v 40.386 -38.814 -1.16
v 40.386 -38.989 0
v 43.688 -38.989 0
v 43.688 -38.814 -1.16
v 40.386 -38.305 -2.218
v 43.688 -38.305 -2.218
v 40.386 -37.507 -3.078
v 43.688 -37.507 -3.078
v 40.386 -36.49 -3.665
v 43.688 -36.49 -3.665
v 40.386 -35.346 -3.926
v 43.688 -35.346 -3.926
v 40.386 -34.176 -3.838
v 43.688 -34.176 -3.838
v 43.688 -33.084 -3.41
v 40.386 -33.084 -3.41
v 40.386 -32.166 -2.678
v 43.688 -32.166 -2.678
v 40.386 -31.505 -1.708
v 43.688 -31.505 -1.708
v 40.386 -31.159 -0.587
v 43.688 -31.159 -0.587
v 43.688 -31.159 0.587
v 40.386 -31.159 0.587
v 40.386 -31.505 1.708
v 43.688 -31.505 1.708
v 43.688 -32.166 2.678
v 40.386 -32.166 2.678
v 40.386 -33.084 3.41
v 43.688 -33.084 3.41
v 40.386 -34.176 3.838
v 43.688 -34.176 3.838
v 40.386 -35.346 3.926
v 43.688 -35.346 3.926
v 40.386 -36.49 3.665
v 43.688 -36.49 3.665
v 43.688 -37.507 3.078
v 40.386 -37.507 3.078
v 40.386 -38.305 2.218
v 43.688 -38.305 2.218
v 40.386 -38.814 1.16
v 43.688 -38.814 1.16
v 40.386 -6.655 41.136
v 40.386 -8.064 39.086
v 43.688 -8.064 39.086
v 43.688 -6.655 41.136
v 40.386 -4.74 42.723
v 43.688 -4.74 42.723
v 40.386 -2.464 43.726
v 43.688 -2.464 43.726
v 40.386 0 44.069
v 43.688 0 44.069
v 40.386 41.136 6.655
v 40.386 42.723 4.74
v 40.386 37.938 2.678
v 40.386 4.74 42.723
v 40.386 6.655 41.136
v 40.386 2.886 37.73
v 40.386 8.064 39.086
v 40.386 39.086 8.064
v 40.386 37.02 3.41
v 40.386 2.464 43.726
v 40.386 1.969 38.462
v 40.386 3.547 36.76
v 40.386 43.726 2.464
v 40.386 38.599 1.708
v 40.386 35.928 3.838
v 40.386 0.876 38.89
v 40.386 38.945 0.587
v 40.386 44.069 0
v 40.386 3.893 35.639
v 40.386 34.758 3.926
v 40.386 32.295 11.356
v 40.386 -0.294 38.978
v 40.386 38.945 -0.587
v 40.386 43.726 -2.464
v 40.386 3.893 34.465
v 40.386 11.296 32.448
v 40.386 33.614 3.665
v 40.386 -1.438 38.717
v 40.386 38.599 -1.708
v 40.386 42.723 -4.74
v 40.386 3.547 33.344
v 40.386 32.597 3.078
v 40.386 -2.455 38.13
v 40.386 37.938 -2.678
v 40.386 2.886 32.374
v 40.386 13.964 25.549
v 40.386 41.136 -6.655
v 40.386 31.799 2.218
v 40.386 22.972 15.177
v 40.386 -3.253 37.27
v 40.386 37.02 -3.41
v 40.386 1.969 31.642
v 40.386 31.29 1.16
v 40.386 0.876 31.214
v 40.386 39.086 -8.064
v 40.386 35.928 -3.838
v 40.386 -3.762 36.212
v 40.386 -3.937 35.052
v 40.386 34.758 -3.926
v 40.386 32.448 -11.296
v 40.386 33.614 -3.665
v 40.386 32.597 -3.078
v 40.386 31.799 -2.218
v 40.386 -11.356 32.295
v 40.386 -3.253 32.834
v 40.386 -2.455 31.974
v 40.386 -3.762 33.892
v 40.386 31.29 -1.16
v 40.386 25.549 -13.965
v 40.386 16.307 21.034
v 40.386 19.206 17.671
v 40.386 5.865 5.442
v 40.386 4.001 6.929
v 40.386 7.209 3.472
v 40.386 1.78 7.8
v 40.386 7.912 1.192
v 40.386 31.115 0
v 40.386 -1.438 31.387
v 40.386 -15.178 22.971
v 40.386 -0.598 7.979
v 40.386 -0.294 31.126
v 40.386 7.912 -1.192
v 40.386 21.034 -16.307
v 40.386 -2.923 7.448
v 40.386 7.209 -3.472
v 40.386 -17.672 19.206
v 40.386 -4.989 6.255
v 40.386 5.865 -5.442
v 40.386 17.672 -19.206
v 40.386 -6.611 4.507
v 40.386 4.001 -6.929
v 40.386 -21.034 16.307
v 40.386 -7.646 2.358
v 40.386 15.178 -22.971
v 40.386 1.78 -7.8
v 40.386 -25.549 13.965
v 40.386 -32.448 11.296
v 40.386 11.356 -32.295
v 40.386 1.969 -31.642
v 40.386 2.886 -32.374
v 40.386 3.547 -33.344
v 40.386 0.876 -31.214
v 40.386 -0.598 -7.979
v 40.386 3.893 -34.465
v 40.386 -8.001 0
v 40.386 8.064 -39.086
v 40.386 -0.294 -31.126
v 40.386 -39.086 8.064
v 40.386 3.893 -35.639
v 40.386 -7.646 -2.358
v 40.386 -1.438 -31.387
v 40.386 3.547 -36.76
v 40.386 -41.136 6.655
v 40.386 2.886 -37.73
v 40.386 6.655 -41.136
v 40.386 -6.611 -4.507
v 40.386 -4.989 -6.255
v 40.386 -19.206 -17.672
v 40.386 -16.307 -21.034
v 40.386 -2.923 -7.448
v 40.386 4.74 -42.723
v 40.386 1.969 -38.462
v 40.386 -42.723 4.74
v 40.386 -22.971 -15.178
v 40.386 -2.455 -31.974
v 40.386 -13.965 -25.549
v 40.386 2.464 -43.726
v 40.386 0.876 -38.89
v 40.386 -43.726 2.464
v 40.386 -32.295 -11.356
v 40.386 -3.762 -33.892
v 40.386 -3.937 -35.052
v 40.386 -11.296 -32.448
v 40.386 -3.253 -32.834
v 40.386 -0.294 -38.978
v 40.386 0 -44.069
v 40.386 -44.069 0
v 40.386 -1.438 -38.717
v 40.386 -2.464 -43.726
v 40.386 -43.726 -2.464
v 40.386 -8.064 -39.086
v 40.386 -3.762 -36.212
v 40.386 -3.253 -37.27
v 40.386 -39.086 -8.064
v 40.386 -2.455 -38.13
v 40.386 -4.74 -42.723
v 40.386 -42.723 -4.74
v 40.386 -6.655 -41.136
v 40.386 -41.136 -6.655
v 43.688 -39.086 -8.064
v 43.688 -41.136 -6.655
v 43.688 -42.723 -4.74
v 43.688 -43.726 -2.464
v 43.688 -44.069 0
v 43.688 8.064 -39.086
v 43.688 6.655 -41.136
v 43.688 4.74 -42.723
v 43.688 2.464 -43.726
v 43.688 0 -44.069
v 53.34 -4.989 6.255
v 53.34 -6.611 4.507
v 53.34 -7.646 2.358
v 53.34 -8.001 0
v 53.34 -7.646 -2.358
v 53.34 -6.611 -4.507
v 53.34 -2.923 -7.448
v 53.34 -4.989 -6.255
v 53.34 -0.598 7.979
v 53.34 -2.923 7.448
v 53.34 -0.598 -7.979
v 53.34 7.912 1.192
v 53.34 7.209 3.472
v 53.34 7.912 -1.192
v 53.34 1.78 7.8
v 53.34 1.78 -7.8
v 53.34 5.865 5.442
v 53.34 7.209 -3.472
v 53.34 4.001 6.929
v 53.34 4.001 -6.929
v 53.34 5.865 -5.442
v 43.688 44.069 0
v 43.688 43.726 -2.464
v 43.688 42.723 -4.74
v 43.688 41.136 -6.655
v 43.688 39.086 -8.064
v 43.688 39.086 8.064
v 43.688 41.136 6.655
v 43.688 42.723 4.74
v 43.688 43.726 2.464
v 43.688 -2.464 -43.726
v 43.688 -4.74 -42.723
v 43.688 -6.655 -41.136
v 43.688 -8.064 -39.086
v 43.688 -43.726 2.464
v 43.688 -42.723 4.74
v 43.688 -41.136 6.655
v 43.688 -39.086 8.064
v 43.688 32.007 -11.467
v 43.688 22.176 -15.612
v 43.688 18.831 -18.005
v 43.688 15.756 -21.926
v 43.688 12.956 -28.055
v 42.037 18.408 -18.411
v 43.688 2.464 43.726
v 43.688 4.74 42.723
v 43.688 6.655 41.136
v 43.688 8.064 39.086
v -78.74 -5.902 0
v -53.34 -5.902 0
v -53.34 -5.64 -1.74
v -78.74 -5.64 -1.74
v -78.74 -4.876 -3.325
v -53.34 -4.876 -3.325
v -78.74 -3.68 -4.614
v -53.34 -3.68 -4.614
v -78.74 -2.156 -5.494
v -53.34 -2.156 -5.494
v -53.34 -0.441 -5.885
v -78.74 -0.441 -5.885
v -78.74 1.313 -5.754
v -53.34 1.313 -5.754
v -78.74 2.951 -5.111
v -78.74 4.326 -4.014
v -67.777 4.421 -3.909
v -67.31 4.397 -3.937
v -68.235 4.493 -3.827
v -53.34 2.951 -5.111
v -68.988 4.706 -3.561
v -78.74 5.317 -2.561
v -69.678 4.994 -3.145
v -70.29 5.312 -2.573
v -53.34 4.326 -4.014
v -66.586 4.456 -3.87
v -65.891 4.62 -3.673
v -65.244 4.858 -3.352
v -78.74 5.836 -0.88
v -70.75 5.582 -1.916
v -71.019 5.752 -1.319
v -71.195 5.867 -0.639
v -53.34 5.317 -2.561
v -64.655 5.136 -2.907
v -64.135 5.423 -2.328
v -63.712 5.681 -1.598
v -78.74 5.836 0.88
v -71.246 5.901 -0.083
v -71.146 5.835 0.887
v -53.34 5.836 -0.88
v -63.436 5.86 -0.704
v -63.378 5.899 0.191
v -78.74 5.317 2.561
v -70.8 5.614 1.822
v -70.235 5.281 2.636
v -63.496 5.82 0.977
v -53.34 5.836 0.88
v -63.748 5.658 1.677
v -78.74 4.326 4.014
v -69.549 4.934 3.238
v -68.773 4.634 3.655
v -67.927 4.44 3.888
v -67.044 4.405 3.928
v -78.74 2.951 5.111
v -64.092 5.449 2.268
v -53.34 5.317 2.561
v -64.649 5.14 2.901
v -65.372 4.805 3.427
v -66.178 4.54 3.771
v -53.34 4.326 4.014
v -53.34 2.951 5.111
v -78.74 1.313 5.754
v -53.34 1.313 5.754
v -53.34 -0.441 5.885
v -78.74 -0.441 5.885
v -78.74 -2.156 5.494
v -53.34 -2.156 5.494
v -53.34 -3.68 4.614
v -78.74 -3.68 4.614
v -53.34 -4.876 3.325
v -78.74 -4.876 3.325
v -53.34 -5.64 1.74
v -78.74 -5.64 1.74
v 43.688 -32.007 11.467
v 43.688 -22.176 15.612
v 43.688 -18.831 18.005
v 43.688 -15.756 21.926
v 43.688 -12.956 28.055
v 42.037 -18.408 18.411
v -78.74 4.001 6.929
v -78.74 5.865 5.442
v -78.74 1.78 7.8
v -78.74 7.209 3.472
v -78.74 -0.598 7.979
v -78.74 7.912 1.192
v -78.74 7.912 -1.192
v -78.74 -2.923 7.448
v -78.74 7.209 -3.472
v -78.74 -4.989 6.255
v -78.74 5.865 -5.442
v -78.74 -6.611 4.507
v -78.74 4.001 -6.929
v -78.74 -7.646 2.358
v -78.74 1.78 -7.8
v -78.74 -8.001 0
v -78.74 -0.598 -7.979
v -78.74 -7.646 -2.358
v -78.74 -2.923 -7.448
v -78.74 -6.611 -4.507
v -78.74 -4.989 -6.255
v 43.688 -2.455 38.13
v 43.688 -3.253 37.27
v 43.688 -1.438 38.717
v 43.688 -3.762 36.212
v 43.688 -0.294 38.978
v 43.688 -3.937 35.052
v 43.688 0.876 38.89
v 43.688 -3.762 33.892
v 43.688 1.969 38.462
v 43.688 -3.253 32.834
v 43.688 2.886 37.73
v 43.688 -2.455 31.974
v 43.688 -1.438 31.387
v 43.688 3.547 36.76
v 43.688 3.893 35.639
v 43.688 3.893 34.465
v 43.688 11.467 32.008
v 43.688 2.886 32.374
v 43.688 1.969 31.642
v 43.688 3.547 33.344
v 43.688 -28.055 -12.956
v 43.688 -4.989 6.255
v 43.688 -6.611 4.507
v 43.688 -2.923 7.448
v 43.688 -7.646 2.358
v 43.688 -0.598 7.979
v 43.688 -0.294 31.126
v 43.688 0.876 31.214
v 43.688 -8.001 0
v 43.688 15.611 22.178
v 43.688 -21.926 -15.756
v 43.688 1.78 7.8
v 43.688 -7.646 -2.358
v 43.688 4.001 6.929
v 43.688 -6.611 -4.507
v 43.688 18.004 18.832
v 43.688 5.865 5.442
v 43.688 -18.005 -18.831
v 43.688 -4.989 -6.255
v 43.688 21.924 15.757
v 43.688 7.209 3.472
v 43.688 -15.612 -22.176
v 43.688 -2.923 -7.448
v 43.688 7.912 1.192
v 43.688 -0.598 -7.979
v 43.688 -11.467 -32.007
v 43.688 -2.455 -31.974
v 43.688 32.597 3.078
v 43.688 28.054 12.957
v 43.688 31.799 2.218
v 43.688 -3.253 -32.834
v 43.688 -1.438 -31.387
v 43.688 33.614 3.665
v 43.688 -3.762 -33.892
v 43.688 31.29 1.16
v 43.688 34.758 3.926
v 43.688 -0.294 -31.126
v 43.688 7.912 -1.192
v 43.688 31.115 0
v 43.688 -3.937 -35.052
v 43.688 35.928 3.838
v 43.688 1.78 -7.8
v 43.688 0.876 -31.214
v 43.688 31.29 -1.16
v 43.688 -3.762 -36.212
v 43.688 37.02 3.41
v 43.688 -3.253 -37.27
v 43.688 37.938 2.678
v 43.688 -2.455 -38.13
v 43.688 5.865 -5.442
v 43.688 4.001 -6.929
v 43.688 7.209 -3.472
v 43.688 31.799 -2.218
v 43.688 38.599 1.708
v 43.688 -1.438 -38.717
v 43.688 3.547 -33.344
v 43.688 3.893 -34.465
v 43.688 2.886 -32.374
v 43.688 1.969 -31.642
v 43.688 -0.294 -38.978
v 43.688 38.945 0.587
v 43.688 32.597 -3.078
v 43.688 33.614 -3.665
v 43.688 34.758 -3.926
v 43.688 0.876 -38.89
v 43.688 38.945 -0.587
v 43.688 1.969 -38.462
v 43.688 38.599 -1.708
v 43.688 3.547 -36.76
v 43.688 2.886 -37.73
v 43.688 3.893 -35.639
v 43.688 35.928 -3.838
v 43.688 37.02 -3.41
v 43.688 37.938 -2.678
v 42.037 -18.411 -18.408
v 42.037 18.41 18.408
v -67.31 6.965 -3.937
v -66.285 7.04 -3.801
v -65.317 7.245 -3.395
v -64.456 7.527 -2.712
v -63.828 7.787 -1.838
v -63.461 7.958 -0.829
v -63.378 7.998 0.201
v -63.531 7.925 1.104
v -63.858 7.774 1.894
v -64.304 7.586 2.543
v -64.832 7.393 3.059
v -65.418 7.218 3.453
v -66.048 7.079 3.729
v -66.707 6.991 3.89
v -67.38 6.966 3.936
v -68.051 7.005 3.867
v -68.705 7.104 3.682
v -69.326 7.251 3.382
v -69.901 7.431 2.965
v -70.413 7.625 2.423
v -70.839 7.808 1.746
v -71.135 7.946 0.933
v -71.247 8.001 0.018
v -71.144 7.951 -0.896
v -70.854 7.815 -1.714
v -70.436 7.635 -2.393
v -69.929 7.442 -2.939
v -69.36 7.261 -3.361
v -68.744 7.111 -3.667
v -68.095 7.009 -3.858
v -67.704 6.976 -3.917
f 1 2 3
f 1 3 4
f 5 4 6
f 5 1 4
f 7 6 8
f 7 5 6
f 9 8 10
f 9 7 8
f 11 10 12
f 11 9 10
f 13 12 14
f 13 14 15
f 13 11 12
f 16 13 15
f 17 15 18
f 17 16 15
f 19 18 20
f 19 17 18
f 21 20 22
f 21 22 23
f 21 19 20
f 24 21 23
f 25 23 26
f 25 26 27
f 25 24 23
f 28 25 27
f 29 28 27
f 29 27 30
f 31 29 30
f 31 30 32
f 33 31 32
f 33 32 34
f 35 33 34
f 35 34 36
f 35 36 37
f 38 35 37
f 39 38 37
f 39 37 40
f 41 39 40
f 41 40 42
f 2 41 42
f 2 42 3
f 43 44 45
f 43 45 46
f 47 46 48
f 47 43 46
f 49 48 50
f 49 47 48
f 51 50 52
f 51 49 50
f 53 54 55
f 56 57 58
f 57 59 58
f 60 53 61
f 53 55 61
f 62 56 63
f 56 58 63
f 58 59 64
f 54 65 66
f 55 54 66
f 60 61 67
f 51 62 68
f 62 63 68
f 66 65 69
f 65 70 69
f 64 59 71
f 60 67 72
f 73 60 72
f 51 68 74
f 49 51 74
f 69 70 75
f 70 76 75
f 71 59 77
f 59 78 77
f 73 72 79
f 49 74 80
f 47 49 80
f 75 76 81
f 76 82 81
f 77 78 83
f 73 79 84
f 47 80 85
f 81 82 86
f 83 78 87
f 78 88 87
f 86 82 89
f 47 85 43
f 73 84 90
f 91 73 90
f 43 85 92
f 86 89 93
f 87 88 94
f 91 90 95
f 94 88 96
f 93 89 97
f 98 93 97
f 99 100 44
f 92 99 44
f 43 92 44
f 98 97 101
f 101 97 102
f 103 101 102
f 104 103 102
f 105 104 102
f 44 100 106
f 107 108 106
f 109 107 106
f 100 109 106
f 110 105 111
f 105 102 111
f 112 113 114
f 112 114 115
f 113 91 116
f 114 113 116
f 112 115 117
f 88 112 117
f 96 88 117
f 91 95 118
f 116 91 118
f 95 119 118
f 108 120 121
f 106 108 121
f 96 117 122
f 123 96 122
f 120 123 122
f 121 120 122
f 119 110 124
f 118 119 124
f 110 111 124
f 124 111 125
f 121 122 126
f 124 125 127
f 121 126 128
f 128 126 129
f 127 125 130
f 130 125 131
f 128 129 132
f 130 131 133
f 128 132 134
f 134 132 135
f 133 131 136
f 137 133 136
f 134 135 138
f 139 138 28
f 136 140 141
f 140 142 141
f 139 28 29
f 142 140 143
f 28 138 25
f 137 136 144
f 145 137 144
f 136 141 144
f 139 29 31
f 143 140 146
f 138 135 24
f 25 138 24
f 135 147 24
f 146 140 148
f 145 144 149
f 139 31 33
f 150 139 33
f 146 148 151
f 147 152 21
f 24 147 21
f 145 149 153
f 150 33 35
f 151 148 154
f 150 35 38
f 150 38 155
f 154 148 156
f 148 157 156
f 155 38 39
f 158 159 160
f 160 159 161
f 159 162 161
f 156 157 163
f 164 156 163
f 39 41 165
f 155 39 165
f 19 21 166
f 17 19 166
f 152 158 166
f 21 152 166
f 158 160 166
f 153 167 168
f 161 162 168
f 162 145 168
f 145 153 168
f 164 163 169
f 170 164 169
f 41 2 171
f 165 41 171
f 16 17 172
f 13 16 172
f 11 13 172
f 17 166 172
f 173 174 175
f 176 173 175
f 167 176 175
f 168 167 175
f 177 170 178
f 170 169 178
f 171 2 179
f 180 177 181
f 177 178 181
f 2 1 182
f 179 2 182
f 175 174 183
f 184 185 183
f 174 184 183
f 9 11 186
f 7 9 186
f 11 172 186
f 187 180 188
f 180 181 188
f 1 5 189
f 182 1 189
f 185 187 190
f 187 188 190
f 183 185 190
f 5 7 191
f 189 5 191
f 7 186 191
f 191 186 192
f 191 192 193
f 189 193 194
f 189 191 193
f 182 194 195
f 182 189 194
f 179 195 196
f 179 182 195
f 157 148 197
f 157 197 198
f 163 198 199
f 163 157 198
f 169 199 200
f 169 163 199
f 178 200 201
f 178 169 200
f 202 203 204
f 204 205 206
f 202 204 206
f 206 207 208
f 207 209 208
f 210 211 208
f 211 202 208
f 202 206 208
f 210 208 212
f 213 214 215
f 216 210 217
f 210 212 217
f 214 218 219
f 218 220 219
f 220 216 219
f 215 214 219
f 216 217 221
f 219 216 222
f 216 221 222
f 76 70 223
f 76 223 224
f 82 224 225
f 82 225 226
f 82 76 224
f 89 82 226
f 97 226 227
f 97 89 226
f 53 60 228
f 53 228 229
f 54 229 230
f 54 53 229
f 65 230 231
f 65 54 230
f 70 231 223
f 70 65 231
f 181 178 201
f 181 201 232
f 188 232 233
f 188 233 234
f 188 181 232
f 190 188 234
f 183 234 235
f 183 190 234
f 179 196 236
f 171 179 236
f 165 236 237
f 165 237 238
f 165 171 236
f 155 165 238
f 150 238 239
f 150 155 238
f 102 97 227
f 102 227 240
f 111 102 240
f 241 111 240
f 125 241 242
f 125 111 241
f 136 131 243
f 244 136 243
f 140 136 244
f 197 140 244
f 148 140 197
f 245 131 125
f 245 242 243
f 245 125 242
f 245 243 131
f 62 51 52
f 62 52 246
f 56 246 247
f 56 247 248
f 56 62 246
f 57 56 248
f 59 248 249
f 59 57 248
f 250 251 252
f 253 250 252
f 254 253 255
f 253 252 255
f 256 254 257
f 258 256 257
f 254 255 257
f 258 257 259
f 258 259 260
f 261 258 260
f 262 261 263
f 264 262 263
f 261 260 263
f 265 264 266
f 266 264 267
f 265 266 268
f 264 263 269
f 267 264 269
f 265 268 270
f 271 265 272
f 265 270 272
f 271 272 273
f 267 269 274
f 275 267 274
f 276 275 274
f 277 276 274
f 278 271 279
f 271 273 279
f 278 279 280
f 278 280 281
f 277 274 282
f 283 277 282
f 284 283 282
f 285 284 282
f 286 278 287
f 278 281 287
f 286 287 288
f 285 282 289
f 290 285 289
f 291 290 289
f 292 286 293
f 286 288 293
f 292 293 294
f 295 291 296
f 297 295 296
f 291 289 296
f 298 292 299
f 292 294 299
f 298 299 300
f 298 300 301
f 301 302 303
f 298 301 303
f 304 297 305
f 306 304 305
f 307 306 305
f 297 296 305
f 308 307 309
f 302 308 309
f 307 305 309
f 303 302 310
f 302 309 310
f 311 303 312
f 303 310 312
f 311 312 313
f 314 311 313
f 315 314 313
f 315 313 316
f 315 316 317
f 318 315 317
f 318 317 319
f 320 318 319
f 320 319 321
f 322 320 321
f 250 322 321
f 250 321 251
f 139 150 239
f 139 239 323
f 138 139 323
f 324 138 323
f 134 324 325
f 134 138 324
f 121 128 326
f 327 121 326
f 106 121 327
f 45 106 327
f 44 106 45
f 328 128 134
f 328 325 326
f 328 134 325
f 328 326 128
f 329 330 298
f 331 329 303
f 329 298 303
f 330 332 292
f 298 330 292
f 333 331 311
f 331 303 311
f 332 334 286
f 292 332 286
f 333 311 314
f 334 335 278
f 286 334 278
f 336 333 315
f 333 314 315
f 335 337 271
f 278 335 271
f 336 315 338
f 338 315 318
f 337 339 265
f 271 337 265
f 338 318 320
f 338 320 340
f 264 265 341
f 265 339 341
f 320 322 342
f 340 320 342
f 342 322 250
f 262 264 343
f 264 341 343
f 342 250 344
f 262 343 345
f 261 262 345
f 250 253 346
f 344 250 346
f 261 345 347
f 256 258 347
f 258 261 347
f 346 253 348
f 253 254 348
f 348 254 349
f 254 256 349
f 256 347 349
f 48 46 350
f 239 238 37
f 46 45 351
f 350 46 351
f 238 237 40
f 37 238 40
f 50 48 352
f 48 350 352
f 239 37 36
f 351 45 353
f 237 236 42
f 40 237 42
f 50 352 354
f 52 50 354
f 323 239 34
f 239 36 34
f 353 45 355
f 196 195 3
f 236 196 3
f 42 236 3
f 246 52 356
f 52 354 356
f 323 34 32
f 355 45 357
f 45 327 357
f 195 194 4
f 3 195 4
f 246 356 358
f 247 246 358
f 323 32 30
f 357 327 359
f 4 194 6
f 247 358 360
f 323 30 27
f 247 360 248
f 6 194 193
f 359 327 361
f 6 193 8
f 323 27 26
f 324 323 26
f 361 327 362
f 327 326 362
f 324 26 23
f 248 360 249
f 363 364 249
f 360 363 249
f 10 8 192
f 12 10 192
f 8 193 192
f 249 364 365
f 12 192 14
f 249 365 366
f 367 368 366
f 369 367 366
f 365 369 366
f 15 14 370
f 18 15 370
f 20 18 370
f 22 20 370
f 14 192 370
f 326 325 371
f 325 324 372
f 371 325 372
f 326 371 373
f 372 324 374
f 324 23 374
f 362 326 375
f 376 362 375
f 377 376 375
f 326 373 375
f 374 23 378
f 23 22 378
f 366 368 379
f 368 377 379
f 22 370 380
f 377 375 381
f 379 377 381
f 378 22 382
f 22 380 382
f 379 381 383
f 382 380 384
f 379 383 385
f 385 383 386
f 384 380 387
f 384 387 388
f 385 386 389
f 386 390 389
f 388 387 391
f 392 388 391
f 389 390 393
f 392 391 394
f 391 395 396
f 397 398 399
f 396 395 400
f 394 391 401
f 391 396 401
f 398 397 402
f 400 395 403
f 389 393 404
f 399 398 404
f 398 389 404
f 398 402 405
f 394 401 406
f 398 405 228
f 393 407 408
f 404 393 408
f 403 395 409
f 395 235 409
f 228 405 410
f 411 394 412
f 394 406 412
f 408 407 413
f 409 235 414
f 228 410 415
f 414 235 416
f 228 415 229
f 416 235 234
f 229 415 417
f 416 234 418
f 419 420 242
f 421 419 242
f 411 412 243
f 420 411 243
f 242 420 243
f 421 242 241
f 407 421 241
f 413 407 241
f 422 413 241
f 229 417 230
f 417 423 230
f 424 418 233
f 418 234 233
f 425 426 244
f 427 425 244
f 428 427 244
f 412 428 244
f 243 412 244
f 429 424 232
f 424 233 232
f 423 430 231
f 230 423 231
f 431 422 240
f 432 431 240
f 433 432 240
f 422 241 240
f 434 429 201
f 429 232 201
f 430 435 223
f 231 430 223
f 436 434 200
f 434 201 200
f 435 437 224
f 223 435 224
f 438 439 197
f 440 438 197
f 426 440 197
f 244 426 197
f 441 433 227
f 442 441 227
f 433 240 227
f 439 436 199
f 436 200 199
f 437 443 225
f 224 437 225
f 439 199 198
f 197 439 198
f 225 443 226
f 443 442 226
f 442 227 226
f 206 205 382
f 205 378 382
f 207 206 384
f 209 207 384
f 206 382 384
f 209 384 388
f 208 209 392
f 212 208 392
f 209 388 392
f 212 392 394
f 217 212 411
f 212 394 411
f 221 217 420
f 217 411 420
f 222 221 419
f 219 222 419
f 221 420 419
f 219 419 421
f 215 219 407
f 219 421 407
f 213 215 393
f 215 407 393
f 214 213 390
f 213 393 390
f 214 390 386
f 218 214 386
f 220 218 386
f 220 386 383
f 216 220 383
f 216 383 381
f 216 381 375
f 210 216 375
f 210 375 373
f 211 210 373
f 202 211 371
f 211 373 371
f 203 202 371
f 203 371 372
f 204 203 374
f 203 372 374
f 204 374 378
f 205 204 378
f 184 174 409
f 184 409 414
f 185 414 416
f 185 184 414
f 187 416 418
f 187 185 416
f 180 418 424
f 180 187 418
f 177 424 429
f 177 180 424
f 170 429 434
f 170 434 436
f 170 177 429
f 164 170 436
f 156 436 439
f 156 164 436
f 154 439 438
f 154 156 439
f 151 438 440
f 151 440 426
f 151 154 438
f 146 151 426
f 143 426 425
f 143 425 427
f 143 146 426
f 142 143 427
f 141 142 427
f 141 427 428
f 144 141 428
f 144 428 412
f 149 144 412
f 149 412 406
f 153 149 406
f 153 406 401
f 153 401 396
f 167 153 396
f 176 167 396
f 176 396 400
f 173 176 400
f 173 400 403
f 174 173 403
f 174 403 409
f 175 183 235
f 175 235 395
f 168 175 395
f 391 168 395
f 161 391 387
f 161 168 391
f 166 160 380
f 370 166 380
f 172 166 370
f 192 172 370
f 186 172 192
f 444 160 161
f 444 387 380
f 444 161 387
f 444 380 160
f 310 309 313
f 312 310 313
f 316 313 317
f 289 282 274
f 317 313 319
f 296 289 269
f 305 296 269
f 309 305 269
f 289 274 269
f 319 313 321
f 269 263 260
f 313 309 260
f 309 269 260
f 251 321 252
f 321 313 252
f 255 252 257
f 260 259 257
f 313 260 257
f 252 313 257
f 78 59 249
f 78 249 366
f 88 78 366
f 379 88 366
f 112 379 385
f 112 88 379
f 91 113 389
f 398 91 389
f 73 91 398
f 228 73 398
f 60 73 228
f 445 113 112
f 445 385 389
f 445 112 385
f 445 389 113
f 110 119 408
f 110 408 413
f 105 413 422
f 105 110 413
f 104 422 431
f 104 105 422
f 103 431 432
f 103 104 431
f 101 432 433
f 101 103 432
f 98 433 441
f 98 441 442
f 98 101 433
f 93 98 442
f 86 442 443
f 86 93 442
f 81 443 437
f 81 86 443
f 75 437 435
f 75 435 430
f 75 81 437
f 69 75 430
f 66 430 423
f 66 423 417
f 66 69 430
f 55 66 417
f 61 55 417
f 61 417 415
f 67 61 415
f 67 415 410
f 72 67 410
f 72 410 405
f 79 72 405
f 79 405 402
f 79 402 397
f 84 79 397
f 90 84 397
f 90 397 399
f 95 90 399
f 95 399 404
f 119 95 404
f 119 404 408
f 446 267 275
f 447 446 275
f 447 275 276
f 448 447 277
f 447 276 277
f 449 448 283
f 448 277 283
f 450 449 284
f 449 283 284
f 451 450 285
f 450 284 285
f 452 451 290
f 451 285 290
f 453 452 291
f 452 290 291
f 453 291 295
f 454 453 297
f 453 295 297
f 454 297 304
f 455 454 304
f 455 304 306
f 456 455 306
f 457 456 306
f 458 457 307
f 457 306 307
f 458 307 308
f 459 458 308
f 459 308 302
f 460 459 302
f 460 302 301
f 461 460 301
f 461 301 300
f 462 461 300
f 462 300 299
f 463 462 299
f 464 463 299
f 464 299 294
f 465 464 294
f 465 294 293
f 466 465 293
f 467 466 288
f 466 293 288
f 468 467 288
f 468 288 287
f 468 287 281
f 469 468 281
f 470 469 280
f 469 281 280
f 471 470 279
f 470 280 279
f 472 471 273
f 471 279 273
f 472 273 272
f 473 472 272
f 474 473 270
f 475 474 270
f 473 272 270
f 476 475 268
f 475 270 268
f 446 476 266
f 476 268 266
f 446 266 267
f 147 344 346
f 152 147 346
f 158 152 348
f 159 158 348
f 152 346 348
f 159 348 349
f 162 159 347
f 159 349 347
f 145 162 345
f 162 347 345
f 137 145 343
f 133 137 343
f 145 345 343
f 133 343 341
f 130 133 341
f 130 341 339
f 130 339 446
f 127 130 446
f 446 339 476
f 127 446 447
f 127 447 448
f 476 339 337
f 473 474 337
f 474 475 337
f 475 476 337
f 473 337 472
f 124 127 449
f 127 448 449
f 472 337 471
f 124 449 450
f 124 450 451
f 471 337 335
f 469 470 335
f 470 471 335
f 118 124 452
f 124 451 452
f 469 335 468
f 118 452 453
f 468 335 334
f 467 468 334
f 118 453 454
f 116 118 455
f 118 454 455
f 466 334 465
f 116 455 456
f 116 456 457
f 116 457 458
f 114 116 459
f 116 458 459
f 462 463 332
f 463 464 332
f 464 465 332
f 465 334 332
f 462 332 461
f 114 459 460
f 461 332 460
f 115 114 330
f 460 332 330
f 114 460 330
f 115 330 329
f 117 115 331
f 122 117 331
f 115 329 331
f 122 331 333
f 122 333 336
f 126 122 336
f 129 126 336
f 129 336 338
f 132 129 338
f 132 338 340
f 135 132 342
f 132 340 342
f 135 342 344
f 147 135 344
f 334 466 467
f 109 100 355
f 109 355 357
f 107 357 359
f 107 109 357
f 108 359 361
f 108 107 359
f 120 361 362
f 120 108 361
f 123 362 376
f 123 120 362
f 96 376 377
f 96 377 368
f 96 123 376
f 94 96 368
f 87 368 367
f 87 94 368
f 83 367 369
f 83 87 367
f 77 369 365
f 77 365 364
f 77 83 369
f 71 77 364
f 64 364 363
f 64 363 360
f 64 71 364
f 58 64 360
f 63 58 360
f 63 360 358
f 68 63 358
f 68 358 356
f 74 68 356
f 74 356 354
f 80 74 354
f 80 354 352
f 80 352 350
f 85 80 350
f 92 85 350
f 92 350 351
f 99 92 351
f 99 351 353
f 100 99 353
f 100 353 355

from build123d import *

# Parameters (mm, degrees)
HOLE1_D            = 7.874
HOLE1_DEPTH        = 7.62
SKETCH5_R          = 3.937
CUT_EXTRUDE5_DEPTH = 43.688


with BuildPart() as part:
    # Sketch2 → Revolve1 (revolve)
    with BuildSketch(Plane.XY, mode=Mode.PRIVATE) as revolve1_sk:
        Polygon((-78.74, 8.001), (-78.74, 5.901826446), (-53.34, 5.901826446), (-53.34, 0), (53.34, 0), (53.34, 8.001), (43.688, 8.001), (43.688, 44.069), (40.386, 44.069), (40.386, 8.001), align=None)
    revolve(revolve1_sk.sketch.rotate(Axis((-53.34, 0, 0), (1, 0, 0)), 180), axis=Axis((-53.34, 0, 0), (1, 0, 0)))

    # Hole1
    with Locations(Plane(origin=(-67.31, 8.001, 0), x_dir=(0, 0, 1), z_dir=(0, 1, 0))):
        with Locations((0, 0)):
            Hole(HOLE1_D / 2, depth=HOLE1_DEPTH)

    # Sketch5 → Cut-Extrude5 (cut)
    with BuildSketch(Plane(origin=(0, 0, 0), x_dir=(0, 0, -1), z_dir=(1, 0, 0))):
        with BuildLine():
            ThreePointArc((-8.064098995, 39.086426403), (-4.739613176, 42.72287713), (0, 44.069))
            ThreePointArc((0, 44.069), (-31.16148874, 31.16148874), (-44.069, 0))
            ThreePointArc((-44.069, 0), (-42.72287713, 4.739613176), (-39.086426403, 8.064098995))
            add(Edge.make_bspline(
                [(-39.086426403, 8.064098995), (-32.863680484, 12.182521195), (-14.294768831, 14.295822644), (-12.182274492, 32.864426866), (-8.064098995, 39.086426403)],
                knots=[0, 0, 0, 0, 0.500028123, 1, 1, 1, 1], degree=3))
        make_face()
        with BuildLine():
            ThreePointArc((-44.069, 0), (-31.16148874, -31.16148874), (0, -44.069))
            ThreePointArc((0, -44.069), (-4.739613176, -42.72287713), (-8.064098995, -39.086426403))
            add(Edge.make_bspline(
                [(-8.064098995, -39.086426403), (-12.182485102, -32.863323284), (-14.296876524, -14.294960375), (-32.864680523, -12.182036473), (-39.086426403, -8.064098995)],
                knots=[0, 0, 0, 0, 0.50005114, 1, 1, 1, 1], degree=3))
            ThreePointArc((-39.086426403, -8.064098995), (-42.72287713, -4.739613176), (-44.069, 0))
        make_face()
        with Locations(Location((0, -35.052, 0), (0, 0, 270))):
            Circle(SKETCH5_R)
        with BuildLine():
            ThreePointArc((0, -44.069), (31.16148874, -31.16148874), (44.069, 0))
            ThreePointArc((44.069, 0), (42.72287713, -4.739613176), (39.086426403, -8.064098995))
            add(Edge.make_bspline(
                [(39.086426403, -8.064098995), (32.863323284, -12.182485102), (14.294960375, -14.296876524), (12.182036473, -32.864680523), (8.064098995, -39.086426403)],
                knots=[0, 0, 0, 0, 0.50005114, 1, 1, 1, 1], degree=3))
            ThreePointArc((8.064098995, -39.086426403), (4.739613176, -42.72287713), (0, -44.069))
        make_face()
        with Locations(Location((35.052, 0, 0), (0, 0, 270))):
            Circle(SKETCH5_R)
        with BuildLine():
            ThreePointArc((39.086426403, 8.064098995), (42.72287713, 4.739613176), (44.069, 0))
            ThreePointArc((44.069, 0), (31.16148874, 31.16148874), (0, 44.069))
            ThreePointArc((0, 44.069), (4.739613176, 42.72287713), (8.064098995, 39.086426403))
            add(Edge.make_bspline(
                [(8.064098995, 39.086426403), (12.182485102, 32.863323284), (14.296876524, 14.294960375), (32.864680523, 12.182036473), (39.086426403, 8.064098995)],
                knots=[0, 0, 0, 0, 0.50005114, 1, 1, 1, 1], degree=3))
        make_face()
        with Locations(Location((0, 35.052, 0), (0, 0, 270))):
            Circle(SKETCH5_R)
        with Locations(Location((-35.052, 0, 0), (0, 0, 270))):
            Circle(SKETCH5_R)
    extrude(amount=CUT_EXTRUDE5_DEPTH, mode=Mode.SUBTRACT)


solid = part.part
